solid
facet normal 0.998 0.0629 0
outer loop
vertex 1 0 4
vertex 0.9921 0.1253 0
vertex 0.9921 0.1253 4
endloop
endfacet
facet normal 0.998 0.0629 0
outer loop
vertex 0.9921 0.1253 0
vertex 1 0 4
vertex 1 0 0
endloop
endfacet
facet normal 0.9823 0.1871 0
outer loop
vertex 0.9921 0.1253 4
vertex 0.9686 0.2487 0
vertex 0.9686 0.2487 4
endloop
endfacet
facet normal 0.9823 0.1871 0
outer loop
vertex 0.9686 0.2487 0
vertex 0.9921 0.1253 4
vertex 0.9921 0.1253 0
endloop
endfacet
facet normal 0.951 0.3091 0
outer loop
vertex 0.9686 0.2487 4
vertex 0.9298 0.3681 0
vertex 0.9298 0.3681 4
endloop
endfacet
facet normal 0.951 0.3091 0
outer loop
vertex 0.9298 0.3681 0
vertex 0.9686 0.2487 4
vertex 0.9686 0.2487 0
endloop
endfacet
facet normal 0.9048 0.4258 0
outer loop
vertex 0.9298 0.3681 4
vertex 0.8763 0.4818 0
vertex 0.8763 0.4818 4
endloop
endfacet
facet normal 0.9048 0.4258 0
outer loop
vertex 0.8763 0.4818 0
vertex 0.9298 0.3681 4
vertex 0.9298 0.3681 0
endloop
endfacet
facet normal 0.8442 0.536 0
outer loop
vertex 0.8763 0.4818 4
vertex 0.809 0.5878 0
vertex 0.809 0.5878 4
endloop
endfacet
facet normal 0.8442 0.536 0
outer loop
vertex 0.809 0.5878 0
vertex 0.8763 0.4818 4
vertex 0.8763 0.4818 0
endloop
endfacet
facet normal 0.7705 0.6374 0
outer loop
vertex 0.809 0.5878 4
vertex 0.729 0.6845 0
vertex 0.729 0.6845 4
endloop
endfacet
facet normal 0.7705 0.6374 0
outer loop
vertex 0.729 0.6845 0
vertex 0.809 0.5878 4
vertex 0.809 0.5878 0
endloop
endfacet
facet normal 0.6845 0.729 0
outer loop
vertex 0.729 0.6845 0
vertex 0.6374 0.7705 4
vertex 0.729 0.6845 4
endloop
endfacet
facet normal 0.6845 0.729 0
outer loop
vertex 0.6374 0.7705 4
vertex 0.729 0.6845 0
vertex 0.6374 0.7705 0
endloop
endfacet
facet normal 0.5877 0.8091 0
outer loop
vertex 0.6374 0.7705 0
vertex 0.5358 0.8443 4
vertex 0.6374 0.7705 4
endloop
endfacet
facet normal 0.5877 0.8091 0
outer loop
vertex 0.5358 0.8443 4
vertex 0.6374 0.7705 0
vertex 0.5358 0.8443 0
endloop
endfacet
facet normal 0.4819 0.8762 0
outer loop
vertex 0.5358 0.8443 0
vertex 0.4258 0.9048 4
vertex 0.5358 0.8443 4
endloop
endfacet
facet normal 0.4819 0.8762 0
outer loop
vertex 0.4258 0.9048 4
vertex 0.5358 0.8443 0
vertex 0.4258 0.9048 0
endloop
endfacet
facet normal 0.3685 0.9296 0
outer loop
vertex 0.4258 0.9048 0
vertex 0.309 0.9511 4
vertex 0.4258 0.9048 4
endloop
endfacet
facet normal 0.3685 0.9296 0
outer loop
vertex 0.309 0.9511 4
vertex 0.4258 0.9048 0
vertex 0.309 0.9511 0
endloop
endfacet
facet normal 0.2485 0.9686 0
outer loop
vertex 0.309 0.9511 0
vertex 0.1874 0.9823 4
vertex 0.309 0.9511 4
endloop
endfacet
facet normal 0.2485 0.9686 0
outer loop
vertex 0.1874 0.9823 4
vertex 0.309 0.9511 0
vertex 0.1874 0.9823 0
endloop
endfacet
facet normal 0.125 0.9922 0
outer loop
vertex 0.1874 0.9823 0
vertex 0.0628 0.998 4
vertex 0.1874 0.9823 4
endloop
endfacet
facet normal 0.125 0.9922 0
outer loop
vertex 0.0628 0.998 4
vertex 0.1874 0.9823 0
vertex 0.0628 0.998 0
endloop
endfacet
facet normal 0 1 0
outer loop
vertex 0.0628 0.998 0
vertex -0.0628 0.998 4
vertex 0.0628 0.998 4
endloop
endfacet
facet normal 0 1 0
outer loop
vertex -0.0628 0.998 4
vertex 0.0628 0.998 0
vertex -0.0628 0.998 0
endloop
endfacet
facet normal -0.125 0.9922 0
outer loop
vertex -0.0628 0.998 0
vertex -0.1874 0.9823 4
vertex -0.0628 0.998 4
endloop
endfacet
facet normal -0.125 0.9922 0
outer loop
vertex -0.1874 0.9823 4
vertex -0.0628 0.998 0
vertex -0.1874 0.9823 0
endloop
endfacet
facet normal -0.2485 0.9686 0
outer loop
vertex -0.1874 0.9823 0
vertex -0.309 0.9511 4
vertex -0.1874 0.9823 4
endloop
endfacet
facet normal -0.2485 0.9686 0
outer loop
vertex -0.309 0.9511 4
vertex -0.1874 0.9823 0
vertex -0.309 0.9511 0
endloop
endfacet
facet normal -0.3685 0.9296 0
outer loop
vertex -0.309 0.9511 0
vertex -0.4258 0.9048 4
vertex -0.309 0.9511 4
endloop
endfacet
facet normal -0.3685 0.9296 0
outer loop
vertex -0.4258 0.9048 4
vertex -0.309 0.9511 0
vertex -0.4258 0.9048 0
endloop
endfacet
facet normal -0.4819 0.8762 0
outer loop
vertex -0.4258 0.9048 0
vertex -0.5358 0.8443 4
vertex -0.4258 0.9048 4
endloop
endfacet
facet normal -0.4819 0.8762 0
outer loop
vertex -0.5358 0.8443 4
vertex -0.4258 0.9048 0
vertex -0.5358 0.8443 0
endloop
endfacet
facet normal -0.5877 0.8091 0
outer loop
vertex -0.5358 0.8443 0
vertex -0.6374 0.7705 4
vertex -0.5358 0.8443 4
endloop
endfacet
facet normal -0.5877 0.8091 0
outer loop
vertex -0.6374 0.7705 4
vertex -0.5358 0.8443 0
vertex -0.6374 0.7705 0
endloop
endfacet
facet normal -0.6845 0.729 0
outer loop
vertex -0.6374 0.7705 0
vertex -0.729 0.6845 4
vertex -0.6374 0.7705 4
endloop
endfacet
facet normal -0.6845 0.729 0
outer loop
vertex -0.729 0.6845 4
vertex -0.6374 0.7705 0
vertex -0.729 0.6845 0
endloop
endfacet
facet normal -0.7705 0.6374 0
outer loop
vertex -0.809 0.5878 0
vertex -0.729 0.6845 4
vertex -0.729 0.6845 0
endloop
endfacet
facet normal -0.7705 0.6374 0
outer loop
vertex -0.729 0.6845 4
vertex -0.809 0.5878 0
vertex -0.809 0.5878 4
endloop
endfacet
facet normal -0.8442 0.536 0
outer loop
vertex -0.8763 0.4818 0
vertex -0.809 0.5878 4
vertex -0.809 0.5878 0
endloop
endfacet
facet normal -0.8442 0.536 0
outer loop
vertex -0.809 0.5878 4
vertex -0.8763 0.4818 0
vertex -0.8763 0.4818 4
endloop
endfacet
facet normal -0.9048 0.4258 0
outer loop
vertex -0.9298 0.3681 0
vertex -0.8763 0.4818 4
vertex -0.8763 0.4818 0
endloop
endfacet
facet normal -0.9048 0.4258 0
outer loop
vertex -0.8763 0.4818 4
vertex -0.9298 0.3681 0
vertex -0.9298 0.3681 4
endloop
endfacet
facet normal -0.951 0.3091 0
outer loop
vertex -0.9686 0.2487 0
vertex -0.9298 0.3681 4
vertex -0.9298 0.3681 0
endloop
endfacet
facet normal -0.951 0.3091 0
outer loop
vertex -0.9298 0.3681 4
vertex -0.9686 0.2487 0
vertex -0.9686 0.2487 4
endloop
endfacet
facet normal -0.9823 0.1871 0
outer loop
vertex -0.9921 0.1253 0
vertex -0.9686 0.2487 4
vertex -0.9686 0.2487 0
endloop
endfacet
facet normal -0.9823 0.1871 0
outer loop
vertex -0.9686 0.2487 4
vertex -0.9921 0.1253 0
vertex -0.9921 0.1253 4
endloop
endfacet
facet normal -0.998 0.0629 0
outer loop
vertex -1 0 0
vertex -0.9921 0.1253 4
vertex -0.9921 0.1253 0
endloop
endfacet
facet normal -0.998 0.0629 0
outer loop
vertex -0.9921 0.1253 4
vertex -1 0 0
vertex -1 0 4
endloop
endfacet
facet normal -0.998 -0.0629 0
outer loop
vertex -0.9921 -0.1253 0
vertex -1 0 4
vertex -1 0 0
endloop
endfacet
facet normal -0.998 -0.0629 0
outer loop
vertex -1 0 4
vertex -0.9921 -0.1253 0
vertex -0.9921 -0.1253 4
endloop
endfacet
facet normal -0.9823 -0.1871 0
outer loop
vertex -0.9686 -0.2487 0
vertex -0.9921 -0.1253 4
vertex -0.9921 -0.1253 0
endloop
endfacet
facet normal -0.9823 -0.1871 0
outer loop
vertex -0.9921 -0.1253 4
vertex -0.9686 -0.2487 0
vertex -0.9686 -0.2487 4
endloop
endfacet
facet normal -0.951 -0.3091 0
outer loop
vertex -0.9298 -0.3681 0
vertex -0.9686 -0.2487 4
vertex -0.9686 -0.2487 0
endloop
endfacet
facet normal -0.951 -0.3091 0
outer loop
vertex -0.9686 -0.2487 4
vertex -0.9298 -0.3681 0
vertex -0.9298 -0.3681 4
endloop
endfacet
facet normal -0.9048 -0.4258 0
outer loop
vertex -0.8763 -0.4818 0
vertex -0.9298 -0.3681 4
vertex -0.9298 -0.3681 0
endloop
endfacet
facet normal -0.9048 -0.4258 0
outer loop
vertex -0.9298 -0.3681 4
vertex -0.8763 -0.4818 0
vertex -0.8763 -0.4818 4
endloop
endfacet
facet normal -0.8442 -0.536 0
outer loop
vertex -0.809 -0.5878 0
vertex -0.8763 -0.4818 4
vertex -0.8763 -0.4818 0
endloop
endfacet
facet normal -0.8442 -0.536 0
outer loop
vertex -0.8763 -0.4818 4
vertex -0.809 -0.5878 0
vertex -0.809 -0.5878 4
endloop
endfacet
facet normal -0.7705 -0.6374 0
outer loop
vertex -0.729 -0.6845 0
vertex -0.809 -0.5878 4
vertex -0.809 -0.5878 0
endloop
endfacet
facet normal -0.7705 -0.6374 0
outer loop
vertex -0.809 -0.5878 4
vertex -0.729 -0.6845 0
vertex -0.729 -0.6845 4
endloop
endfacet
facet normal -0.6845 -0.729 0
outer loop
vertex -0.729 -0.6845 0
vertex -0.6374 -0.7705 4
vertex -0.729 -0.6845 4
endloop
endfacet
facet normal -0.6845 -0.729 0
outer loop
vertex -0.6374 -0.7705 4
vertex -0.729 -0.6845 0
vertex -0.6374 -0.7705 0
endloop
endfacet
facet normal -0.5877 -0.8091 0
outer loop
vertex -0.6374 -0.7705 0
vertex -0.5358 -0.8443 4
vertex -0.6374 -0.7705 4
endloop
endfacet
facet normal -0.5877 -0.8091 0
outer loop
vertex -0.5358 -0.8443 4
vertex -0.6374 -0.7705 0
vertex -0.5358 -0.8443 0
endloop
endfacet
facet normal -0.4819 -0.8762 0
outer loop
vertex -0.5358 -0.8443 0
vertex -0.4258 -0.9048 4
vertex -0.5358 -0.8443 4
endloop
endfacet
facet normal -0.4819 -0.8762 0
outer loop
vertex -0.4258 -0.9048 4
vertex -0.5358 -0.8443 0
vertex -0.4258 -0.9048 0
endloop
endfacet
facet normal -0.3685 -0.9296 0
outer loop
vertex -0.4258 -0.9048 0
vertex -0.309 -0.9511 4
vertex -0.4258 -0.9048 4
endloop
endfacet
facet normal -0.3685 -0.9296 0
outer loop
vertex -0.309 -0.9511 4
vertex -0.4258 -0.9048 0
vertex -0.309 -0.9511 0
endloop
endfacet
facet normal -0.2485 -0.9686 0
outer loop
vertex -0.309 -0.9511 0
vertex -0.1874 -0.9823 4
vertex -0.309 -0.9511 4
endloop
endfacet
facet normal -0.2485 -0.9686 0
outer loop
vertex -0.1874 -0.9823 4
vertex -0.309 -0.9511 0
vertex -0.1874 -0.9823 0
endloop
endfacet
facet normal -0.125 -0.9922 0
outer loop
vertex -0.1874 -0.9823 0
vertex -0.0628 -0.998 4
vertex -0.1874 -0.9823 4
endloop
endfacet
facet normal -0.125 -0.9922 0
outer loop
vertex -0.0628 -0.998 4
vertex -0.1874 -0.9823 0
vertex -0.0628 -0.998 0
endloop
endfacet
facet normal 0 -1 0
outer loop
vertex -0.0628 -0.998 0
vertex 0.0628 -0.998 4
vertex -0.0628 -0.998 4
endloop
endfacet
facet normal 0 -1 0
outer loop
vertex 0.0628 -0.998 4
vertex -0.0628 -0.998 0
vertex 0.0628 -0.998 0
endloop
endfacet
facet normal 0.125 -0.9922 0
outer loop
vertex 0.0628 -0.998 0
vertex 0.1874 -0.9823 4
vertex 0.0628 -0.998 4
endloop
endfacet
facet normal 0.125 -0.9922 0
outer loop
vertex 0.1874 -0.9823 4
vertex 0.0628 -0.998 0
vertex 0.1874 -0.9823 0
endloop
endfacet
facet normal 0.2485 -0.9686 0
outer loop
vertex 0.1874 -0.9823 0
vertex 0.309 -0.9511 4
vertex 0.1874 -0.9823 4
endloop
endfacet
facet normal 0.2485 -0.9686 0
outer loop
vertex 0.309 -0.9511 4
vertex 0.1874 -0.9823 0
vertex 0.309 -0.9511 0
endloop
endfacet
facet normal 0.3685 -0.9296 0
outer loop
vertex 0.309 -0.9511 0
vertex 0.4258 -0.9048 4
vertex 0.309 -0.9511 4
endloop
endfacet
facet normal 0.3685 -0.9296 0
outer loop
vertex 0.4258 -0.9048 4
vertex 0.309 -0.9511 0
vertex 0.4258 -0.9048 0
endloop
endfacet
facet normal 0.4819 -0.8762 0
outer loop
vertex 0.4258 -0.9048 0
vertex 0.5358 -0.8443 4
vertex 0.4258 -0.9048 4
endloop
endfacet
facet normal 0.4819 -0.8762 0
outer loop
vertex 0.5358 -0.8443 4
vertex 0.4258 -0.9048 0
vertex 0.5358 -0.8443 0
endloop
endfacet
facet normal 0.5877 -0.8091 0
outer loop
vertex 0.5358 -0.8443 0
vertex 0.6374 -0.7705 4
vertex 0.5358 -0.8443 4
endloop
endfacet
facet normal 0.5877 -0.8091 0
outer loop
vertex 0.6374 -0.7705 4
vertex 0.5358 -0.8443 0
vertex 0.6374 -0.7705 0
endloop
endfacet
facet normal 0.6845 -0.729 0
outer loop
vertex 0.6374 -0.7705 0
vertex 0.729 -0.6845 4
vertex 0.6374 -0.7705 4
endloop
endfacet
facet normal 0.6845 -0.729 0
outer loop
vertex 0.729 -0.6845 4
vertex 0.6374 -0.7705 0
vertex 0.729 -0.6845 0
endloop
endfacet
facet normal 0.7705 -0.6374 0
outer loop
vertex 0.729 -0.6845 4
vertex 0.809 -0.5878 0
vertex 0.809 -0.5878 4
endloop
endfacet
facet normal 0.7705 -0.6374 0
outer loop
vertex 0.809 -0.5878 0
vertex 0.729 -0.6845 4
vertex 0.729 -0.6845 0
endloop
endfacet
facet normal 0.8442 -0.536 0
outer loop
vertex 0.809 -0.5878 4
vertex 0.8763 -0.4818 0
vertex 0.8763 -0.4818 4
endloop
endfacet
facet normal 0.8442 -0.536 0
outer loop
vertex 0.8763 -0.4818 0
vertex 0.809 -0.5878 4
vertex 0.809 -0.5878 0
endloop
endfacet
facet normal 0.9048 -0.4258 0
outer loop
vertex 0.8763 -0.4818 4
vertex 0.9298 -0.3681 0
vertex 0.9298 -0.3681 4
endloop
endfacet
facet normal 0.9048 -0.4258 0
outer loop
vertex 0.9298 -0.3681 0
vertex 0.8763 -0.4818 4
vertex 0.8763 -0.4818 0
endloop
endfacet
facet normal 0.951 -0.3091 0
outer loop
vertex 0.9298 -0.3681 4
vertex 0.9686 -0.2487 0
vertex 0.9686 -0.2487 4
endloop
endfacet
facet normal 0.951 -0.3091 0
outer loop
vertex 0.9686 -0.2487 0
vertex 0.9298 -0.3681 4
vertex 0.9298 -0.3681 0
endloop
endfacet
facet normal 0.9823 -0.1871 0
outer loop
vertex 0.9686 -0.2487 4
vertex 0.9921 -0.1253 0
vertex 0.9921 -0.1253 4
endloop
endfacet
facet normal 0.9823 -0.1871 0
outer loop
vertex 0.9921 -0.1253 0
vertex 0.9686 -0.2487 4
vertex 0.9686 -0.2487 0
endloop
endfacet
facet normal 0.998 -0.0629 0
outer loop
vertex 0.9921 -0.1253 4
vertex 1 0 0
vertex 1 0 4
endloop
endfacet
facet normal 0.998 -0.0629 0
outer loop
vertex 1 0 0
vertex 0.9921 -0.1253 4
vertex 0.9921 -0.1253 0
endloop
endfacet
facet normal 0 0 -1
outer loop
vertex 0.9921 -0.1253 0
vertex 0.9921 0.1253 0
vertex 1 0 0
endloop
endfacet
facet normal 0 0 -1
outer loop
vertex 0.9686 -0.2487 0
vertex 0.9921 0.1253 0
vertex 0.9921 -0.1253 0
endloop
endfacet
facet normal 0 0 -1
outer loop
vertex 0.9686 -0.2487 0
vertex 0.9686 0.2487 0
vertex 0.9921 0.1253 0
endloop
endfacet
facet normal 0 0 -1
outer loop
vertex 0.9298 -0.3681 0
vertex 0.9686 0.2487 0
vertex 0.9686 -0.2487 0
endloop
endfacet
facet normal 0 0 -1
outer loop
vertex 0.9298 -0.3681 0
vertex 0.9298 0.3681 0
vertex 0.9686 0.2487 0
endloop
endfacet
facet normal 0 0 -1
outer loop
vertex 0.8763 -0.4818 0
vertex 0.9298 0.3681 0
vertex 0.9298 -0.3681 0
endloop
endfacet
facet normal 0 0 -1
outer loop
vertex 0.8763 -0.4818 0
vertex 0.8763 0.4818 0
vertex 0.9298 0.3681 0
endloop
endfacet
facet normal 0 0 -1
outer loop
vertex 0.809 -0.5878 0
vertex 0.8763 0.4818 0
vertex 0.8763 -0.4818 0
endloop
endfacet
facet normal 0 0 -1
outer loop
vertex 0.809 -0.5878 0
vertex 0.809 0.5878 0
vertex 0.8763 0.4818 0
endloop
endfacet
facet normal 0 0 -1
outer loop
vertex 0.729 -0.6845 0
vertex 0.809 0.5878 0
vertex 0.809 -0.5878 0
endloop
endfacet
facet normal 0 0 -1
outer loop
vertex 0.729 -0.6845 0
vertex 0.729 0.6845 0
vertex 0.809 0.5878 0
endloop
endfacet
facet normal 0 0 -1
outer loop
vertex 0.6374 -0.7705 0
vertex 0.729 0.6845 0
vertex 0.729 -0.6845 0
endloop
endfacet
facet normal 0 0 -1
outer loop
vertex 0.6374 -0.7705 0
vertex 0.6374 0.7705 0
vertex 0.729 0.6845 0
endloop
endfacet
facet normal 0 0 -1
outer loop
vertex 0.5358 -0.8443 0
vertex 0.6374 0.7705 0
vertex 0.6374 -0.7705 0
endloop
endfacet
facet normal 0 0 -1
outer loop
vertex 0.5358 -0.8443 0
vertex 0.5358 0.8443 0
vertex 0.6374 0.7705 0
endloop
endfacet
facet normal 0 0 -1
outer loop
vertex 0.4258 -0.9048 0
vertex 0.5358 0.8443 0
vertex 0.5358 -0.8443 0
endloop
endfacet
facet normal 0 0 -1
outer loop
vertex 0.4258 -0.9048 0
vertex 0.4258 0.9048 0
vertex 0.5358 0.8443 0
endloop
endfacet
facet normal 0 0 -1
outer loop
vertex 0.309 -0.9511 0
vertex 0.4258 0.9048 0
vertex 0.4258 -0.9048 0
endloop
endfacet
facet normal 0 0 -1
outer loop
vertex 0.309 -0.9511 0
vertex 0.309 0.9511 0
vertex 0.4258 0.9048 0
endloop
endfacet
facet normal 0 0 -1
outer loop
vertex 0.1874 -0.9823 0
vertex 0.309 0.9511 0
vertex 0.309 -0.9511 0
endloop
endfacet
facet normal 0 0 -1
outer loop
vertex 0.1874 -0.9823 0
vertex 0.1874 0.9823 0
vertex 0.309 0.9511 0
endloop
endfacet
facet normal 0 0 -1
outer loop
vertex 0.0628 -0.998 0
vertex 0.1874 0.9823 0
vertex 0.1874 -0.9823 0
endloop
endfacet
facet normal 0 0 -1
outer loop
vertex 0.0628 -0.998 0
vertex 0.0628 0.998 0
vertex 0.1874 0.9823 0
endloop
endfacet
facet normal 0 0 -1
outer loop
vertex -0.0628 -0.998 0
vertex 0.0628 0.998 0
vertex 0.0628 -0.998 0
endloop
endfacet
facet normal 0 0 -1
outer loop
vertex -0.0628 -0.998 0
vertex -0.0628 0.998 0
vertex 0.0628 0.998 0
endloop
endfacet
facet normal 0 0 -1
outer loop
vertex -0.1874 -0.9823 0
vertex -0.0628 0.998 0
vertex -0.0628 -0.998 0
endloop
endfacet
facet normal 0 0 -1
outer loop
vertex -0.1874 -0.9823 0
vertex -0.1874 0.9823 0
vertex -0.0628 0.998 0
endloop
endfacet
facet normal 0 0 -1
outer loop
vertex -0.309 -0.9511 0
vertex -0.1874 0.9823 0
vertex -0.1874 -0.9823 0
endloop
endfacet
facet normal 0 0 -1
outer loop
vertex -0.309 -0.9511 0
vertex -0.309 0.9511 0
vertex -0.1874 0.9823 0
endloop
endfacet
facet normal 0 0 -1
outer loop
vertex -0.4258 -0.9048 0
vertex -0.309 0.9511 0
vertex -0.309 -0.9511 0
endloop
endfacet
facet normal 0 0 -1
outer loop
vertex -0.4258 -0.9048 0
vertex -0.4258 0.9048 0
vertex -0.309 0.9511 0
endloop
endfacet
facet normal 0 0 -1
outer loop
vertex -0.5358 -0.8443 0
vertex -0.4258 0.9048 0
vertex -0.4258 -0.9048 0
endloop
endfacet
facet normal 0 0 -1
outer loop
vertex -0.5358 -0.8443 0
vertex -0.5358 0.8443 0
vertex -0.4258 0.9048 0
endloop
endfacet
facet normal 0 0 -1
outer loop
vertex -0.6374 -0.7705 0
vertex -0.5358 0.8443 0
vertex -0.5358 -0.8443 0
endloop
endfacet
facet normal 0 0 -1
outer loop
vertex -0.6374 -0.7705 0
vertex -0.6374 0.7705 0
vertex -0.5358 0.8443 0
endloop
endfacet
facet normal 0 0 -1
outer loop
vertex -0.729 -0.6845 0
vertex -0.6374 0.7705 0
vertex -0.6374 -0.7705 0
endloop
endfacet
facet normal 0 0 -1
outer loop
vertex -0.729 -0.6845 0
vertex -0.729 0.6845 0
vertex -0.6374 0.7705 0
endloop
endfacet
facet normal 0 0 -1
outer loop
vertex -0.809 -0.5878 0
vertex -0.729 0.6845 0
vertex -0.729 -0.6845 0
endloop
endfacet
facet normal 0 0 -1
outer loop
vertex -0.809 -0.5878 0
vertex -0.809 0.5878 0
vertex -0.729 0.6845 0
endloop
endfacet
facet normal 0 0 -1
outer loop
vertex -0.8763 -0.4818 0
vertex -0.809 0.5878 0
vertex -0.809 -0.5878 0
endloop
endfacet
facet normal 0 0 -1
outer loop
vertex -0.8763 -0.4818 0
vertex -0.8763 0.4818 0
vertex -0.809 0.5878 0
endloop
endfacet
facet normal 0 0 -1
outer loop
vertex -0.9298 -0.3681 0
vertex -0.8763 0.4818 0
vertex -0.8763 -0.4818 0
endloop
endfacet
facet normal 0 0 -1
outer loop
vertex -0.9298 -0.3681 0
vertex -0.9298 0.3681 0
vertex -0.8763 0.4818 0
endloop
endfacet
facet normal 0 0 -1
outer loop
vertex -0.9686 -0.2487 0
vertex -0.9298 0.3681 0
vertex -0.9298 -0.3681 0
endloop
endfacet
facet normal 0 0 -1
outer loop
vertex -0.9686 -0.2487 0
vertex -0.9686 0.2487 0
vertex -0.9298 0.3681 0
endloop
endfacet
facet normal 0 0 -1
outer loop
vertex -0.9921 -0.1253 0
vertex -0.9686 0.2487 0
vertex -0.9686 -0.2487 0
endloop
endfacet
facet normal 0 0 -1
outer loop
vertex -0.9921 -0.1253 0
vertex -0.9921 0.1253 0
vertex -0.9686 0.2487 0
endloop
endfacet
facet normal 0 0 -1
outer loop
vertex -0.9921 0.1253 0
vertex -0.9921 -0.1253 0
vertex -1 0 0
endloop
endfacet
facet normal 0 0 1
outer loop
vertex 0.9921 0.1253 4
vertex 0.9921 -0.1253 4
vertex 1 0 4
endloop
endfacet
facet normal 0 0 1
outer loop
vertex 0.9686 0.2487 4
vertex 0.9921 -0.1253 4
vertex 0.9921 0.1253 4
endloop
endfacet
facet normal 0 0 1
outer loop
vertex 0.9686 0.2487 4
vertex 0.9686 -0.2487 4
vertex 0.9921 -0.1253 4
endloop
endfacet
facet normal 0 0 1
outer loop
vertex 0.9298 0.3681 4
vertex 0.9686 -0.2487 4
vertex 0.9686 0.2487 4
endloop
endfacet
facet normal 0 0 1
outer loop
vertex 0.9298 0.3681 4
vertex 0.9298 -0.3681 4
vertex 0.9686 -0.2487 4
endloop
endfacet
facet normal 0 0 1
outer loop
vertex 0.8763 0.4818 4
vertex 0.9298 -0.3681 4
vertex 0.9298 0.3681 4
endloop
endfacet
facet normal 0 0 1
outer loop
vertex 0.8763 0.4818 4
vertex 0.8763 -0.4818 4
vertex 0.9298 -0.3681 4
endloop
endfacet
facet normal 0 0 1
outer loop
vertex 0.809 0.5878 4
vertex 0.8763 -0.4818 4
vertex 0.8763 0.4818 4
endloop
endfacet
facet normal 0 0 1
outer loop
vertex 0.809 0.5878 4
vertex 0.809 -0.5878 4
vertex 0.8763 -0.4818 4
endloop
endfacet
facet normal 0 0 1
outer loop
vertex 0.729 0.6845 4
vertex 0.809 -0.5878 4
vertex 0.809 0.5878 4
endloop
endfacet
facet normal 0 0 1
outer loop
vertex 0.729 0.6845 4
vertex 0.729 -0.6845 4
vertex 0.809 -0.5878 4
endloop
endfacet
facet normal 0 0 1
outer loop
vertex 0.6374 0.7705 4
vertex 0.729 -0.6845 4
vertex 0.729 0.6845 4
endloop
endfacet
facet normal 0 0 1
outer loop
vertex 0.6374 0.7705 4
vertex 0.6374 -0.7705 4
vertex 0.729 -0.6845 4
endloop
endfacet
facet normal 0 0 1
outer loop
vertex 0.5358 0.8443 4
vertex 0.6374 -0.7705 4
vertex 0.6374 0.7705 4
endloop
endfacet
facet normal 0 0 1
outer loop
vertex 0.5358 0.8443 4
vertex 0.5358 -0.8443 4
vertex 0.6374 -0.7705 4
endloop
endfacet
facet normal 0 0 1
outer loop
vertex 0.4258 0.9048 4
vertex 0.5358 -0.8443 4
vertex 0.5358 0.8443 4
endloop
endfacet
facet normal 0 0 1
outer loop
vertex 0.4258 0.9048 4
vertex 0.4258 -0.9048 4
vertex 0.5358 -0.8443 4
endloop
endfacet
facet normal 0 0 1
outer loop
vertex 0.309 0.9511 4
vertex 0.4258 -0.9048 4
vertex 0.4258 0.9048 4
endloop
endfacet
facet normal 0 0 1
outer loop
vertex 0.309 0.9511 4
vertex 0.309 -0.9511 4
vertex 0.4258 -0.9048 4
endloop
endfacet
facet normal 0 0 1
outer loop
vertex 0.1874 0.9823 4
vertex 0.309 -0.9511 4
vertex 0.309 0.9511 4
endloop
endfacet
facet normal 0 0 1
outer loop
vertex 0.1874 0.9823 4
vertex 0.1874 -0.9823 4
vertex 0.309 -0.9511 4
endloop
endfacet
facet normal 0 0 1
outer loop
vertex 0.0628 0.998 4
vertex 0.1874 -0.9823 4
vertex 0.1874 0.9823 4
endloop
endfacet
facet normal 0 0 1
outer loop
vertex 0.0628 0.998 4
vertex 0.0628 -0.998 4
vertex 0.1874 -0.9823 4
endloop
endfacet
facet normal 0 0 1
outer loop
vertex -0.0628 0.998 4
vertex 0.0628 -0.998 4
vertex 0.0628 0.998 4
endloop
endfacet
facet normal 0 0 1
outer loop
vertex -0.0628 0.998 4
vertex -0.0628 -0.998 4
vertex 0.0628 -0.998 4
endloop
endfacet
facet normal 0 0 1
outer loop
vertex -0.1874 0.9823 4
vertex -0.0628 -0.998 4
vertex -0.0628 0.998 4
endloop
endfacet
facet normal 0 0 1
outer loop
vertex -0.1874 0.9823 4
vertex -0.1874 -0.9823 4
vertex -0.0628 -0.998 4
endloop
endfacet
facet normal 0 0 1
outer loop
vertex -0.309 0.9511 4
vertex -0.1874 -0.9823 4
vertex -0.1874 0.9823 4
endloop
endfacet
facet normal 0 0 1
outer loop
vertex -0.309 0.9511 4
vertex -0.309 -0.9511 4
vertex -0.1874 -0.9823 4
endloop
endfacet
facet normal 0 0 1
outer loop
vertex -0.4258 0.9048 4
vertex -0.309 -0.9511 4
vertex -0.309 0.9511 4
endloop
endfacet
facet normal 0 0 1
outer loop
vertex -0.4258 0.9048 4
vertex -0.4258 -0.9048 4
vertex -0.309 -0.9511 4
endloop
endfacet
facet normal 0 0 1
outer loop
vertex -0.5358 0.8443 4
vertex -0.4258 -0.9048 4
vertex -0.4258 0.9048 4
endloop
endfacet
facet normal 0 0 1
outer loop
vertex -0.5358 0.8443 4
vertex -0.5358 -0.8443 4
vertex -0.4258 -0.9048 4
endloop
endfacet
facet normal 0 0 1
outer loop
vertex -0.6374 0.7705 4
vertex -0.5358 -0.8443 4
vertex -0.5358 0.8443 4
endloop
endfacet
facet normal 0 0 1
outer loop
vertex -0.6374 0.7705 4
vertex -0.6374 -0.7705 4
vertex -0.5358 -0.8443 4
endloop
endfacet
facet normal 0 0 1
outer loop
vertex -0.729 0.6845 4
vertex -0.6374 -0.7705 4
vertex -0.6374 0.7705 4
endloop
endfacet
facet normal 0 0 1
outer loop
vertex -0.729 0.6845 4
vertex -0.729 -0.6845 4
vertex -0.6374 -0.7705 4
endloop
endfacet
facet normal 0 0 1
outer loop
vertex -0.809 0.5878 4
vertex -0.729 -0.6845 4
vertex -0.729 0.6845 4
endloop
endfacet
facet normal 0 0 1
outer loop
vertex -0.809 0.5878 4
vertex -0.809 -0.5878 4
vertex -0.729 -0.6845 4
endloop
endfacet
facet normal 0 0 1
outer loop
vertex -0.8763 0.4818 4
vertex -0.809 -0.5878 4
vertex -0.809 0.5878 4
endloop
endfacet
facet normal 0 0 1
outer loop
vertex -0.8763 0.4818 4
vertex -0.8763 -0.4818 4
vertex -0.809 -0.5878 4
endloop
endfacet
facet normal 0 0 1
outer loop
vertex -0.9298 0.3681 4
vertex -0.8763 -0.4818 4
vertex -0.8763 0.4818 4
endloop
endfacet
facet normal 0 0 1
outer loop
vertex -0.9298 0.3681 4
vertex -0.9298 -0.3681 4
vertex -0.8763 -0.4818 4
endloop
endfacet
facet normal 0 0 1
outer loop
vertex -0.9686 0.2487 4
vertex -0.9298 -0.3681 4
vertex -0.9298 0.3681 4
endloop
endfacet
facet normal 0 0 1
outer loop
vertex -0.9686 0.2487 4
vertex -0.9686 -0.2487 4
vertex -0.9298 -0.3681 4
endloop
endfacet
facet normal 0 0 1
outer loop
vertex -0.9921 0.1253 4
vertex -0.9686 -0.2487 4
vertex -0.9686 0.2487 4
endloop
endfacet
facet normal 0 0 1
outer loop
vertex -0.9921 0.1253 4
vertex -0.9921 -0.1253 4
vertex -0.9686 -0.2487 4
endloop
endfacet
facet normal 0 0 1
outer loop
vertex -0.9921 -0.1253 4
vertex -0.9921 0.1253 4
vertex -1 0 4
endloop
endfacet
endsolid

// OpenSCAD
$fn = 50;
// body
*cylinder(h = 10, r1 = 4, r2 = 0);

// head
*translate([0, 0, 9]) sphere(r=2.5);

// arms
cylinder(h = 4, r = 1);
